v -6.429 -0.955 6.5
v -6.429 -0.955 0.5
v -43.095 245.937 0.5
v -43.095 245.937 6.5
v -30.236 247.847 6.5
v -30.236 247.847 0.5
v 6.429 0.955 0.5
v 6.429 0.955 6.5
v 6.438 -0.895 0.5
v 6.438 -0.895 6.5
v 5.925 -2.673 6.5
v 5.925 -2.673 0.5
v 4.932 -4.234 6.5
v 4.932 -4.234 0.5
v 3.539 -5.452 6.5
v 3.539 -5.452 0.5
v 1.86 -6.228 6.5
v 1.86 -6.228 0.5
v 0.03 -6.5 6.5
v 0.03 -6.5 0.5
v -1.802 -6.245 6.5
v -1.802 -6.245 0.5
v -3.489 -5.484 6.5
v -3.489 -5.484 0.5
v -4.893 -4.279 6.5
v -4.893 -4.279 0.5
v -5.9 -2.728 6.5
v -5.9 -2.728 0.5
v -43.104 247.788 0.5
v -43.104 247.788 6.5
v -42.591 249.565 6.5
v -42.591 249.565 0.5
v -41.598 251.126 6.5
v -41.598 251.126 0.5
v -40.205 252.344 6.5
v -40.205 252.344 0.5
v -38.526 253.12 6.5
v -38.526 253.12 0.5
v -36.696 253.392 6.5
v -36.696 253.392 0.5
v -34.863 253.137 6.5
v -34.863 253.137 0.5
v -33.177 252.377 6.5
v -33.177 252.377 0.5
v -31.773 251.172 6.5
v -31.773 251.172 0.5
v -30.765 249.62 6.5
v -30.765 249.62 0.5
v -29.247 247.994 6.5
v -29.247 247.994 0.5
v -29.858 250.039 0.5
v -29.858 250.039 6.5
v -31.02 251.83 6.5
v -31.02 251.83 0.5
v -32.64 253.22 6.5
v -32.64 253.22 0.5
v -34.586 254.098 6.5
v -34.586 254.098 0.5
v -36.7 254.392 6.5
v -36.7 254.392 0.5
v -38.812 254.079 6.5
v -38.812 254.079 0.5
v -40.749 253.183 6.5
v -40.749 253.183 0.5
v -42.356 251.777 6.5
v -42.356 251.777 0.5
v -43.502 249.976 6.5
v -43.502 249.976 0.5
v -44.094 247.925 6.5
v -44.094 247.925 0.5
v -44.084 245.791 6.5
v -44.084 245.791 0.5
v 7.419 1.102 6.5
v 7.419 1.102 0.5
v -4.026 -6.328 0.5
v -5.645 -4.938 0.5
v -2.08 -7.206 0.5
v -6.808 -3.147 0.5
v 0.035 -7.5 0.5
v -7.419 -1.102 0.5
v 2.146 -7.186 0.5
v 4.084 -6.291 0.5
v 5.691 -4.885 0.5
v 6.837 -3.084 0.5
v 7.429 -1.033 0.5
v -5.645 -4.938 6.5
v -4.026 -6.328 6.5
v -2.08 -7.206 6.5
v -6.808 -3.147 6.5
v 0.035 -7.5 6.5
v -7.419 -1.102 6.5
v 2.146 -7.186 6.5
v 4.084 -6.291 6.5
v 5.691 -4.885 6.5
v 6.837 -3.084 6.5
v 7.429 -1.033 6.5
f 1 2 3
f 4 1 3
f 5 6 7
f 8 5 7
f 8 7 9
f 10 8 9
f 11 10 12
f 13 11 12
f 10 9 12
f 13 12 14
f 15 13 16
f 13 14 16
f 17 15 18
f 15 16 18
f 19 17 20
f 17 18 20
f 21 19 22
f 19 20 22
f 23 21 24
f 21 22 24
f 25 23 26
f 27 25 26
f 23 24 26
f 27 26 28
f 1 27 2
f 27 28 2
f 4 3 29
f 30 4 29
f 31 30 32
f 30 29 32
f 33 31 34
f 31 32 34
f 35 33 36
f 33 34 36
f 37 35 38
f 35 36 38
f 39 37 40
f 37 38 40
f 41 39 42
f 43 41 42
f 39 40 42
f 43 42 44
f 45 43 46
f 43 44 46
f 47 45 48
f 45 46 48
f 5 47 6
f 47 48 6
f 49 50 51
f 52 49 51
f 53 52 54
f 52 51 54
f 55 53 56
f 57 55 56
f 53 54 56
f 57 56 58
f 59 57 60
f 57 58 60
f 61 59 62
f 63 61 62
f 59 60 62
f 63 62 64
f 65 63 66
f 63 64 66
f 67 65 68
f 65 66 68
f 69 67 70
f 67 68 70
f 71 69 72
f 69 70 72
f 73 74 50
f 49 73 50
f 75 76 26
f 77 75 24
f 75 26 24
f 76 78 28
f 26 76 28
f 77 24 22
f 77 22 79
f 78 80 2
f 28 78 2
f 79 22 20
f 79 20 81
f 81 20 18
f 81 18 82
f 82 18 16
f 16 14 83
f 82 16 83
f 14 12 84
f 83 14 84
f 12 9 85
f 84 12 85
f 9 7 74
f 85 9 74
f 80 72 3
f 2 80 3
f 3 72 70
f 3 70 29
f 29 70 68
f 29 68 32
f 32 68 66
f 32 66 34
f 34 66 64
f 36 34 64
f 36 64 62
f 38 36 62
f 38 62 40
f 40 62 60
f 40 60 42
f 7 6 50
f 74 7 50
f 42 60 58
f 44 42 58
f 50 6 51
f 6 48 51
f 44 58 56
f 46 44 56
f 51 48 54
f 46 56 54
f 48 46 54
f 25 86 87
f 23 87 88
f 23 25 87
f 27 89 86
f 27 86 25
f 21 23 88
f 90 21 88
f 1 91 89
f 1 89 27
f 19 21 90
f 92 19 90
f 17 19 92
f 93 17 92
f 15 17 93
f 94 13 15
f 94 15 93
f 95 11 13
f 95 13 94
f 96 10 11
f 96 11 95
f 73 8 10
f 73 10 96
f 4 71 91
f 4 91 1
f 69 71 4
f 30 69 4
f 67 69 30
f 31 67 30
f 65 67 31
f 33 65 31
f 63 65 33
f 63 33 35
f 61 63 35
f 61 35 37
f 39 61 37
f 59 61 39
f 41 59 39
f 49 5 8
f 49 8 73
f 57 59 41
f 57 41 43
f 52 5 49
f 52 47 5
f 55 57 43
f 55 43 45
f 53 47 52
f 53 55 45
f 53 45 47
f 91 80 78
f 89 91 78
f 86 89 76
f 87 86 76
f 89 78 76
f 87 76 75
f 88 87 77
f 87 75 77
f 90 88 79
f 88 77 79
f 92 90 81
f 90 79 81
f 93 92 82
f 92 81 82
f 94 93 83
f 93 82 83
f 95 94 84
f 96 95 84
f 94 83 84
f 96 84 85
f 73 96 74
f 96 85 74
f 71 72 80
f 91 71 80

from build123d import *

# Parameters (mm, degrees)
THICKEN1_START = 0.5
THICKEN1_DEPTH = 6


# Read off the part's stored shape, not the designer's step: Thicken1
with BuildPart() as part:
    # Thicken1 outline → Thicken1 (new body)
    with BuildSketch(Plane.XY.offset(THICKEN1_START)):
        with BuildLine():
            Line((-44.084142674, 245.790557606), (-7.418638396, -1.101727894))
            ThreePointArc((-7.418638396, -1.101727894), (1.101727894, -7.418638396), (7.418638396, 1.101727894))
            Line((7.418638396, 1.101727894), (-29.246865883, 247.994013395))
            ThreePointArc((-29.246865883, 247.994013395), (-37.767232173, 254.310923896), (-44.084142674, 245.790557606))
        make_face()
        with BuildLine():
            ThreePointArc((6.42948661, 0.954830842), (0.954830842, -6.42948661), (-6.42948661, -0.954830842))
            Line((-6.42948661, -0.954830842), (-43.094990888, 245.937454659))
            ThreePointArc((-43.094990888, 245.937454659), (-37.62033512, 253.32177211), (-30.236017669, 247.847116343))
            Line((-30.236017669, 247.847116343), (6.42948661, 0.954830842))
        make_face(mode=Mode.SUBTRACT)
    extrude(amount=THICKEN1_DEPTH)


solid = part.part
